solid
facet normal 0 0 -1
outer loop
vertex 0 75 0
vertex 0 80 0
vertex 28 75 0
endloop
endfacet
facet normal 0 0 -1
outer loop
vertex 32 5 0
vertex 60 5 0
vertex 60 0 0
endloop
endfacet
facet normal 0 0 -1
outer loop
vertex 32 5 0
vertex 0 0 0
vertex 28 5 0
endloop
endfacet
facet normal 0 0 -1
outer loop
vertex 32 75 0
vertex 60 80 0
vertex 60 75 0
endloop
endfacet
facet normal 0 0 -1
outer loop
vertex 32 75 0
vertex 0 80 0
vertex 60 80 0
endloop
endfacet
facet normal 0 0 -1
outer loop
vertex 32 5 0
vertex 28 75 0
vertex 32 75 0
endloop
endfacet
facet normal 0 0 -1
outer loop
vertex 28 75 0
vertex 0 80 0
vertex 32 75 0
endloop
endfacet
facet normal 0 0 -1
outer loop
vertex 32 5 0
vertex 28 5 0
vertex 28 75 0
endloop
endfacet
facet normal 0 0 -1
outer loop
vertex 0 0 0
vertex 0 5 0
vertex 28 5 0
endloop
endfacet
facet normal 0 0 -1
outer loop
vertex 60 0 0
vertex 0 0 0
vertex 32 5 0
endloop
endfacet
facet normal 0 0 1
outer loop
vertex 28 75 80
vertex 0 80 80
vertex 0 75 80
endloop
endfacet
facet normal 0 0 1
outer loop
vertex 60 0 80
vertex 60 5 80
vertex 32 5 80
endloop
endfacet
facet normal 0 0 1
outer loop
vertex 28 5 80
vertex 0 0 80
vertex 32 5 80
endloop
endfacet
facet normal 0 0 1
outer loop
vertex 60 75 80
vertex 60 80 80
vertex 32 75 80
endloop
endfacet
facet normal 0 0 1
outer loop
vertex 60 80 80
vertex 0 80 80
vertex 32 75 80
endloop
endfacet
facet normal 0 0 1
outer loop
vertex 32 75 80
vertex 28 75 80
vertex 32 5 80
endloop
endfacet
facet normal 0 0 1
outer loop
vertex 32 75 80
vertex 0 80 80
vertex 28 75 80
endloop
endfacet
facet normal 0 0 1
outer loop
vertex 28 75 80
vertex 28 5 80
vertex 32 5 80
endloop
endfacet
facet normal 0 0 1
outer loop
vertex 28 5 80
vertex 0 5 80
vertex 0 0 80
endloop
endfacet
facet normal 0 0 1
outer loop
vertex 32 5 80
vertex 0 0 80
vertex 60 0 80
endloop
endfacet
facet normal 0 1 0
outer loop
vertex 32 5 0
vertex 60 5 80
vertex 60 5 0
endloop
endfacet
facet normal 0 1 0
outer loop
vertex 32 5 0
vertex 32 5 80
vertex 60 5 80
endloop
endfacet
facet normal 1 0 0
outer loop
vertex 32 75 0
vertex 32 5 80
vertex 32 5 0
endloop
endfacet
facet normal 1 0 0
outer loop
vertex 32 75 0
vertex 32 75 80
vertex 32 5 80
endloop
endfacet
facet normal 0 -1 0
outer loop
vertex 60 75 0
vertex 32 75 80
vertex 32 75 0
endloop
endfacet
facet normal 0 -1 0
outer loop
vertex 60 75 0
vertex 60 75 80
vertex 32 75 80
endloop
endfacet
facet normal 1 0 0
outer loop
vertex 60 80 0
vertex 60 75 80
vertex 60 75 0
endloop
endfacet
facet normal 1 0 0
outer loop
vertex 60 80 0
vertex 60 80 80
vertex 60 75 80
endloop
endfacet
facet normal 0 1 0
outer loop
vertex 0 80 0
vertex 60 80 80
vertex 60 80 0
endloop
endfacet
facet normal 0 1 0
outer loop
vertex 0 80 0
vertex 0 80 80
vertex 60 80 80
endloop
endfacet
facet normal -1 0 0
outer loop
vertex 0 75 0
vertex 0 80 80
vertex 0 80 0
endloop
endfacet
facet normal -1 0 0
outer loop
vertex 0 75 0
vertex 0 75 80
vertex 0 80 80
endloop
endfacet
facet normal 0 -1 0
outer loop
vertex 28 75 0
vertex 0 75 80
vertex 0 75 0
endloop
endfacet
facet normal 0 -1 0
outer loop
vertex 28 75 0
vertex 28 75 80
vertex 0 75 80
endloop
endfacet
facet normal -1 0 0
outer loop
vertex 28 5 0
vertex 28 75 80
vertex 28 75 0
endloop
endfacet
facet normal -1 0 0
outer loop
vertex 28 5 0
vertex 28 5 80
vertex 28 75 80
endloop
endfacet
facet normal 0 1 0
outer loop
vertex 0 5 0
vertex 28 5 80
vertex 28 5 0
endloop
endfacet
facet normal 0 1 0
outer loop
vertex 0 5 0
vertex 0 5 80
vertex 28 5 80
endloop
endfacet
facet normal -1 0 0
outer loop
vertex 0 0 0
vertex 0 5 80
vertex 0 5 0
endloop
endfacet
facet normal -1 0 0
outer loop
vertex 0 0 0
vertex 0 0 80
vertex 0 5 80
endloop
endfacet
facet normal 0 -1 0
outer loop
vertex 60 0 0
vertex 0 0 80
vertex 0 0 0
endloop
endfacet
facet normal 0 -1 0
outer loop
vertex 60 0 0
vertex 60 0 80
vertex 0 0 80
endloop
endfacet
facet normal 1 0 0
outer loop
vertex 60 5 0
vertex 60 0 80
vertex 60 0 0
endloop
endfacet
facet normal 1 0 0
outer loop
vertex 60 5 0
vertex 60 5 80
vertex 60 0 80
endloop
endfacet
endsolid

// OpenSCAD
$fn = 32;

// ----------------------------------------------------------------------
// Structural section: ibeam 60 x 80 mm
// ----------------------------------------------------------------------

// --- parameters (mm) ---
sec_w = 60;               // section width, X
sec_h = 80;               // section height, Y
flange_t = 5;             // flange thickness
web_t = 4;                // web thickness
plate_t = 80;             // cut length, Z (extrusion height)

profile = [[0, 0], [60, 0], [60, 5], [32, 5], [32, 75], [60, 75], [60, 80], [0, 80], [0, 75], [28, 75], [28, 5], [0, 5]];  // primary outline, 12 points, counter clockwise

// --- the one profile operation ---
linear_extrude(height = plate_t) polygon(points = profile);
